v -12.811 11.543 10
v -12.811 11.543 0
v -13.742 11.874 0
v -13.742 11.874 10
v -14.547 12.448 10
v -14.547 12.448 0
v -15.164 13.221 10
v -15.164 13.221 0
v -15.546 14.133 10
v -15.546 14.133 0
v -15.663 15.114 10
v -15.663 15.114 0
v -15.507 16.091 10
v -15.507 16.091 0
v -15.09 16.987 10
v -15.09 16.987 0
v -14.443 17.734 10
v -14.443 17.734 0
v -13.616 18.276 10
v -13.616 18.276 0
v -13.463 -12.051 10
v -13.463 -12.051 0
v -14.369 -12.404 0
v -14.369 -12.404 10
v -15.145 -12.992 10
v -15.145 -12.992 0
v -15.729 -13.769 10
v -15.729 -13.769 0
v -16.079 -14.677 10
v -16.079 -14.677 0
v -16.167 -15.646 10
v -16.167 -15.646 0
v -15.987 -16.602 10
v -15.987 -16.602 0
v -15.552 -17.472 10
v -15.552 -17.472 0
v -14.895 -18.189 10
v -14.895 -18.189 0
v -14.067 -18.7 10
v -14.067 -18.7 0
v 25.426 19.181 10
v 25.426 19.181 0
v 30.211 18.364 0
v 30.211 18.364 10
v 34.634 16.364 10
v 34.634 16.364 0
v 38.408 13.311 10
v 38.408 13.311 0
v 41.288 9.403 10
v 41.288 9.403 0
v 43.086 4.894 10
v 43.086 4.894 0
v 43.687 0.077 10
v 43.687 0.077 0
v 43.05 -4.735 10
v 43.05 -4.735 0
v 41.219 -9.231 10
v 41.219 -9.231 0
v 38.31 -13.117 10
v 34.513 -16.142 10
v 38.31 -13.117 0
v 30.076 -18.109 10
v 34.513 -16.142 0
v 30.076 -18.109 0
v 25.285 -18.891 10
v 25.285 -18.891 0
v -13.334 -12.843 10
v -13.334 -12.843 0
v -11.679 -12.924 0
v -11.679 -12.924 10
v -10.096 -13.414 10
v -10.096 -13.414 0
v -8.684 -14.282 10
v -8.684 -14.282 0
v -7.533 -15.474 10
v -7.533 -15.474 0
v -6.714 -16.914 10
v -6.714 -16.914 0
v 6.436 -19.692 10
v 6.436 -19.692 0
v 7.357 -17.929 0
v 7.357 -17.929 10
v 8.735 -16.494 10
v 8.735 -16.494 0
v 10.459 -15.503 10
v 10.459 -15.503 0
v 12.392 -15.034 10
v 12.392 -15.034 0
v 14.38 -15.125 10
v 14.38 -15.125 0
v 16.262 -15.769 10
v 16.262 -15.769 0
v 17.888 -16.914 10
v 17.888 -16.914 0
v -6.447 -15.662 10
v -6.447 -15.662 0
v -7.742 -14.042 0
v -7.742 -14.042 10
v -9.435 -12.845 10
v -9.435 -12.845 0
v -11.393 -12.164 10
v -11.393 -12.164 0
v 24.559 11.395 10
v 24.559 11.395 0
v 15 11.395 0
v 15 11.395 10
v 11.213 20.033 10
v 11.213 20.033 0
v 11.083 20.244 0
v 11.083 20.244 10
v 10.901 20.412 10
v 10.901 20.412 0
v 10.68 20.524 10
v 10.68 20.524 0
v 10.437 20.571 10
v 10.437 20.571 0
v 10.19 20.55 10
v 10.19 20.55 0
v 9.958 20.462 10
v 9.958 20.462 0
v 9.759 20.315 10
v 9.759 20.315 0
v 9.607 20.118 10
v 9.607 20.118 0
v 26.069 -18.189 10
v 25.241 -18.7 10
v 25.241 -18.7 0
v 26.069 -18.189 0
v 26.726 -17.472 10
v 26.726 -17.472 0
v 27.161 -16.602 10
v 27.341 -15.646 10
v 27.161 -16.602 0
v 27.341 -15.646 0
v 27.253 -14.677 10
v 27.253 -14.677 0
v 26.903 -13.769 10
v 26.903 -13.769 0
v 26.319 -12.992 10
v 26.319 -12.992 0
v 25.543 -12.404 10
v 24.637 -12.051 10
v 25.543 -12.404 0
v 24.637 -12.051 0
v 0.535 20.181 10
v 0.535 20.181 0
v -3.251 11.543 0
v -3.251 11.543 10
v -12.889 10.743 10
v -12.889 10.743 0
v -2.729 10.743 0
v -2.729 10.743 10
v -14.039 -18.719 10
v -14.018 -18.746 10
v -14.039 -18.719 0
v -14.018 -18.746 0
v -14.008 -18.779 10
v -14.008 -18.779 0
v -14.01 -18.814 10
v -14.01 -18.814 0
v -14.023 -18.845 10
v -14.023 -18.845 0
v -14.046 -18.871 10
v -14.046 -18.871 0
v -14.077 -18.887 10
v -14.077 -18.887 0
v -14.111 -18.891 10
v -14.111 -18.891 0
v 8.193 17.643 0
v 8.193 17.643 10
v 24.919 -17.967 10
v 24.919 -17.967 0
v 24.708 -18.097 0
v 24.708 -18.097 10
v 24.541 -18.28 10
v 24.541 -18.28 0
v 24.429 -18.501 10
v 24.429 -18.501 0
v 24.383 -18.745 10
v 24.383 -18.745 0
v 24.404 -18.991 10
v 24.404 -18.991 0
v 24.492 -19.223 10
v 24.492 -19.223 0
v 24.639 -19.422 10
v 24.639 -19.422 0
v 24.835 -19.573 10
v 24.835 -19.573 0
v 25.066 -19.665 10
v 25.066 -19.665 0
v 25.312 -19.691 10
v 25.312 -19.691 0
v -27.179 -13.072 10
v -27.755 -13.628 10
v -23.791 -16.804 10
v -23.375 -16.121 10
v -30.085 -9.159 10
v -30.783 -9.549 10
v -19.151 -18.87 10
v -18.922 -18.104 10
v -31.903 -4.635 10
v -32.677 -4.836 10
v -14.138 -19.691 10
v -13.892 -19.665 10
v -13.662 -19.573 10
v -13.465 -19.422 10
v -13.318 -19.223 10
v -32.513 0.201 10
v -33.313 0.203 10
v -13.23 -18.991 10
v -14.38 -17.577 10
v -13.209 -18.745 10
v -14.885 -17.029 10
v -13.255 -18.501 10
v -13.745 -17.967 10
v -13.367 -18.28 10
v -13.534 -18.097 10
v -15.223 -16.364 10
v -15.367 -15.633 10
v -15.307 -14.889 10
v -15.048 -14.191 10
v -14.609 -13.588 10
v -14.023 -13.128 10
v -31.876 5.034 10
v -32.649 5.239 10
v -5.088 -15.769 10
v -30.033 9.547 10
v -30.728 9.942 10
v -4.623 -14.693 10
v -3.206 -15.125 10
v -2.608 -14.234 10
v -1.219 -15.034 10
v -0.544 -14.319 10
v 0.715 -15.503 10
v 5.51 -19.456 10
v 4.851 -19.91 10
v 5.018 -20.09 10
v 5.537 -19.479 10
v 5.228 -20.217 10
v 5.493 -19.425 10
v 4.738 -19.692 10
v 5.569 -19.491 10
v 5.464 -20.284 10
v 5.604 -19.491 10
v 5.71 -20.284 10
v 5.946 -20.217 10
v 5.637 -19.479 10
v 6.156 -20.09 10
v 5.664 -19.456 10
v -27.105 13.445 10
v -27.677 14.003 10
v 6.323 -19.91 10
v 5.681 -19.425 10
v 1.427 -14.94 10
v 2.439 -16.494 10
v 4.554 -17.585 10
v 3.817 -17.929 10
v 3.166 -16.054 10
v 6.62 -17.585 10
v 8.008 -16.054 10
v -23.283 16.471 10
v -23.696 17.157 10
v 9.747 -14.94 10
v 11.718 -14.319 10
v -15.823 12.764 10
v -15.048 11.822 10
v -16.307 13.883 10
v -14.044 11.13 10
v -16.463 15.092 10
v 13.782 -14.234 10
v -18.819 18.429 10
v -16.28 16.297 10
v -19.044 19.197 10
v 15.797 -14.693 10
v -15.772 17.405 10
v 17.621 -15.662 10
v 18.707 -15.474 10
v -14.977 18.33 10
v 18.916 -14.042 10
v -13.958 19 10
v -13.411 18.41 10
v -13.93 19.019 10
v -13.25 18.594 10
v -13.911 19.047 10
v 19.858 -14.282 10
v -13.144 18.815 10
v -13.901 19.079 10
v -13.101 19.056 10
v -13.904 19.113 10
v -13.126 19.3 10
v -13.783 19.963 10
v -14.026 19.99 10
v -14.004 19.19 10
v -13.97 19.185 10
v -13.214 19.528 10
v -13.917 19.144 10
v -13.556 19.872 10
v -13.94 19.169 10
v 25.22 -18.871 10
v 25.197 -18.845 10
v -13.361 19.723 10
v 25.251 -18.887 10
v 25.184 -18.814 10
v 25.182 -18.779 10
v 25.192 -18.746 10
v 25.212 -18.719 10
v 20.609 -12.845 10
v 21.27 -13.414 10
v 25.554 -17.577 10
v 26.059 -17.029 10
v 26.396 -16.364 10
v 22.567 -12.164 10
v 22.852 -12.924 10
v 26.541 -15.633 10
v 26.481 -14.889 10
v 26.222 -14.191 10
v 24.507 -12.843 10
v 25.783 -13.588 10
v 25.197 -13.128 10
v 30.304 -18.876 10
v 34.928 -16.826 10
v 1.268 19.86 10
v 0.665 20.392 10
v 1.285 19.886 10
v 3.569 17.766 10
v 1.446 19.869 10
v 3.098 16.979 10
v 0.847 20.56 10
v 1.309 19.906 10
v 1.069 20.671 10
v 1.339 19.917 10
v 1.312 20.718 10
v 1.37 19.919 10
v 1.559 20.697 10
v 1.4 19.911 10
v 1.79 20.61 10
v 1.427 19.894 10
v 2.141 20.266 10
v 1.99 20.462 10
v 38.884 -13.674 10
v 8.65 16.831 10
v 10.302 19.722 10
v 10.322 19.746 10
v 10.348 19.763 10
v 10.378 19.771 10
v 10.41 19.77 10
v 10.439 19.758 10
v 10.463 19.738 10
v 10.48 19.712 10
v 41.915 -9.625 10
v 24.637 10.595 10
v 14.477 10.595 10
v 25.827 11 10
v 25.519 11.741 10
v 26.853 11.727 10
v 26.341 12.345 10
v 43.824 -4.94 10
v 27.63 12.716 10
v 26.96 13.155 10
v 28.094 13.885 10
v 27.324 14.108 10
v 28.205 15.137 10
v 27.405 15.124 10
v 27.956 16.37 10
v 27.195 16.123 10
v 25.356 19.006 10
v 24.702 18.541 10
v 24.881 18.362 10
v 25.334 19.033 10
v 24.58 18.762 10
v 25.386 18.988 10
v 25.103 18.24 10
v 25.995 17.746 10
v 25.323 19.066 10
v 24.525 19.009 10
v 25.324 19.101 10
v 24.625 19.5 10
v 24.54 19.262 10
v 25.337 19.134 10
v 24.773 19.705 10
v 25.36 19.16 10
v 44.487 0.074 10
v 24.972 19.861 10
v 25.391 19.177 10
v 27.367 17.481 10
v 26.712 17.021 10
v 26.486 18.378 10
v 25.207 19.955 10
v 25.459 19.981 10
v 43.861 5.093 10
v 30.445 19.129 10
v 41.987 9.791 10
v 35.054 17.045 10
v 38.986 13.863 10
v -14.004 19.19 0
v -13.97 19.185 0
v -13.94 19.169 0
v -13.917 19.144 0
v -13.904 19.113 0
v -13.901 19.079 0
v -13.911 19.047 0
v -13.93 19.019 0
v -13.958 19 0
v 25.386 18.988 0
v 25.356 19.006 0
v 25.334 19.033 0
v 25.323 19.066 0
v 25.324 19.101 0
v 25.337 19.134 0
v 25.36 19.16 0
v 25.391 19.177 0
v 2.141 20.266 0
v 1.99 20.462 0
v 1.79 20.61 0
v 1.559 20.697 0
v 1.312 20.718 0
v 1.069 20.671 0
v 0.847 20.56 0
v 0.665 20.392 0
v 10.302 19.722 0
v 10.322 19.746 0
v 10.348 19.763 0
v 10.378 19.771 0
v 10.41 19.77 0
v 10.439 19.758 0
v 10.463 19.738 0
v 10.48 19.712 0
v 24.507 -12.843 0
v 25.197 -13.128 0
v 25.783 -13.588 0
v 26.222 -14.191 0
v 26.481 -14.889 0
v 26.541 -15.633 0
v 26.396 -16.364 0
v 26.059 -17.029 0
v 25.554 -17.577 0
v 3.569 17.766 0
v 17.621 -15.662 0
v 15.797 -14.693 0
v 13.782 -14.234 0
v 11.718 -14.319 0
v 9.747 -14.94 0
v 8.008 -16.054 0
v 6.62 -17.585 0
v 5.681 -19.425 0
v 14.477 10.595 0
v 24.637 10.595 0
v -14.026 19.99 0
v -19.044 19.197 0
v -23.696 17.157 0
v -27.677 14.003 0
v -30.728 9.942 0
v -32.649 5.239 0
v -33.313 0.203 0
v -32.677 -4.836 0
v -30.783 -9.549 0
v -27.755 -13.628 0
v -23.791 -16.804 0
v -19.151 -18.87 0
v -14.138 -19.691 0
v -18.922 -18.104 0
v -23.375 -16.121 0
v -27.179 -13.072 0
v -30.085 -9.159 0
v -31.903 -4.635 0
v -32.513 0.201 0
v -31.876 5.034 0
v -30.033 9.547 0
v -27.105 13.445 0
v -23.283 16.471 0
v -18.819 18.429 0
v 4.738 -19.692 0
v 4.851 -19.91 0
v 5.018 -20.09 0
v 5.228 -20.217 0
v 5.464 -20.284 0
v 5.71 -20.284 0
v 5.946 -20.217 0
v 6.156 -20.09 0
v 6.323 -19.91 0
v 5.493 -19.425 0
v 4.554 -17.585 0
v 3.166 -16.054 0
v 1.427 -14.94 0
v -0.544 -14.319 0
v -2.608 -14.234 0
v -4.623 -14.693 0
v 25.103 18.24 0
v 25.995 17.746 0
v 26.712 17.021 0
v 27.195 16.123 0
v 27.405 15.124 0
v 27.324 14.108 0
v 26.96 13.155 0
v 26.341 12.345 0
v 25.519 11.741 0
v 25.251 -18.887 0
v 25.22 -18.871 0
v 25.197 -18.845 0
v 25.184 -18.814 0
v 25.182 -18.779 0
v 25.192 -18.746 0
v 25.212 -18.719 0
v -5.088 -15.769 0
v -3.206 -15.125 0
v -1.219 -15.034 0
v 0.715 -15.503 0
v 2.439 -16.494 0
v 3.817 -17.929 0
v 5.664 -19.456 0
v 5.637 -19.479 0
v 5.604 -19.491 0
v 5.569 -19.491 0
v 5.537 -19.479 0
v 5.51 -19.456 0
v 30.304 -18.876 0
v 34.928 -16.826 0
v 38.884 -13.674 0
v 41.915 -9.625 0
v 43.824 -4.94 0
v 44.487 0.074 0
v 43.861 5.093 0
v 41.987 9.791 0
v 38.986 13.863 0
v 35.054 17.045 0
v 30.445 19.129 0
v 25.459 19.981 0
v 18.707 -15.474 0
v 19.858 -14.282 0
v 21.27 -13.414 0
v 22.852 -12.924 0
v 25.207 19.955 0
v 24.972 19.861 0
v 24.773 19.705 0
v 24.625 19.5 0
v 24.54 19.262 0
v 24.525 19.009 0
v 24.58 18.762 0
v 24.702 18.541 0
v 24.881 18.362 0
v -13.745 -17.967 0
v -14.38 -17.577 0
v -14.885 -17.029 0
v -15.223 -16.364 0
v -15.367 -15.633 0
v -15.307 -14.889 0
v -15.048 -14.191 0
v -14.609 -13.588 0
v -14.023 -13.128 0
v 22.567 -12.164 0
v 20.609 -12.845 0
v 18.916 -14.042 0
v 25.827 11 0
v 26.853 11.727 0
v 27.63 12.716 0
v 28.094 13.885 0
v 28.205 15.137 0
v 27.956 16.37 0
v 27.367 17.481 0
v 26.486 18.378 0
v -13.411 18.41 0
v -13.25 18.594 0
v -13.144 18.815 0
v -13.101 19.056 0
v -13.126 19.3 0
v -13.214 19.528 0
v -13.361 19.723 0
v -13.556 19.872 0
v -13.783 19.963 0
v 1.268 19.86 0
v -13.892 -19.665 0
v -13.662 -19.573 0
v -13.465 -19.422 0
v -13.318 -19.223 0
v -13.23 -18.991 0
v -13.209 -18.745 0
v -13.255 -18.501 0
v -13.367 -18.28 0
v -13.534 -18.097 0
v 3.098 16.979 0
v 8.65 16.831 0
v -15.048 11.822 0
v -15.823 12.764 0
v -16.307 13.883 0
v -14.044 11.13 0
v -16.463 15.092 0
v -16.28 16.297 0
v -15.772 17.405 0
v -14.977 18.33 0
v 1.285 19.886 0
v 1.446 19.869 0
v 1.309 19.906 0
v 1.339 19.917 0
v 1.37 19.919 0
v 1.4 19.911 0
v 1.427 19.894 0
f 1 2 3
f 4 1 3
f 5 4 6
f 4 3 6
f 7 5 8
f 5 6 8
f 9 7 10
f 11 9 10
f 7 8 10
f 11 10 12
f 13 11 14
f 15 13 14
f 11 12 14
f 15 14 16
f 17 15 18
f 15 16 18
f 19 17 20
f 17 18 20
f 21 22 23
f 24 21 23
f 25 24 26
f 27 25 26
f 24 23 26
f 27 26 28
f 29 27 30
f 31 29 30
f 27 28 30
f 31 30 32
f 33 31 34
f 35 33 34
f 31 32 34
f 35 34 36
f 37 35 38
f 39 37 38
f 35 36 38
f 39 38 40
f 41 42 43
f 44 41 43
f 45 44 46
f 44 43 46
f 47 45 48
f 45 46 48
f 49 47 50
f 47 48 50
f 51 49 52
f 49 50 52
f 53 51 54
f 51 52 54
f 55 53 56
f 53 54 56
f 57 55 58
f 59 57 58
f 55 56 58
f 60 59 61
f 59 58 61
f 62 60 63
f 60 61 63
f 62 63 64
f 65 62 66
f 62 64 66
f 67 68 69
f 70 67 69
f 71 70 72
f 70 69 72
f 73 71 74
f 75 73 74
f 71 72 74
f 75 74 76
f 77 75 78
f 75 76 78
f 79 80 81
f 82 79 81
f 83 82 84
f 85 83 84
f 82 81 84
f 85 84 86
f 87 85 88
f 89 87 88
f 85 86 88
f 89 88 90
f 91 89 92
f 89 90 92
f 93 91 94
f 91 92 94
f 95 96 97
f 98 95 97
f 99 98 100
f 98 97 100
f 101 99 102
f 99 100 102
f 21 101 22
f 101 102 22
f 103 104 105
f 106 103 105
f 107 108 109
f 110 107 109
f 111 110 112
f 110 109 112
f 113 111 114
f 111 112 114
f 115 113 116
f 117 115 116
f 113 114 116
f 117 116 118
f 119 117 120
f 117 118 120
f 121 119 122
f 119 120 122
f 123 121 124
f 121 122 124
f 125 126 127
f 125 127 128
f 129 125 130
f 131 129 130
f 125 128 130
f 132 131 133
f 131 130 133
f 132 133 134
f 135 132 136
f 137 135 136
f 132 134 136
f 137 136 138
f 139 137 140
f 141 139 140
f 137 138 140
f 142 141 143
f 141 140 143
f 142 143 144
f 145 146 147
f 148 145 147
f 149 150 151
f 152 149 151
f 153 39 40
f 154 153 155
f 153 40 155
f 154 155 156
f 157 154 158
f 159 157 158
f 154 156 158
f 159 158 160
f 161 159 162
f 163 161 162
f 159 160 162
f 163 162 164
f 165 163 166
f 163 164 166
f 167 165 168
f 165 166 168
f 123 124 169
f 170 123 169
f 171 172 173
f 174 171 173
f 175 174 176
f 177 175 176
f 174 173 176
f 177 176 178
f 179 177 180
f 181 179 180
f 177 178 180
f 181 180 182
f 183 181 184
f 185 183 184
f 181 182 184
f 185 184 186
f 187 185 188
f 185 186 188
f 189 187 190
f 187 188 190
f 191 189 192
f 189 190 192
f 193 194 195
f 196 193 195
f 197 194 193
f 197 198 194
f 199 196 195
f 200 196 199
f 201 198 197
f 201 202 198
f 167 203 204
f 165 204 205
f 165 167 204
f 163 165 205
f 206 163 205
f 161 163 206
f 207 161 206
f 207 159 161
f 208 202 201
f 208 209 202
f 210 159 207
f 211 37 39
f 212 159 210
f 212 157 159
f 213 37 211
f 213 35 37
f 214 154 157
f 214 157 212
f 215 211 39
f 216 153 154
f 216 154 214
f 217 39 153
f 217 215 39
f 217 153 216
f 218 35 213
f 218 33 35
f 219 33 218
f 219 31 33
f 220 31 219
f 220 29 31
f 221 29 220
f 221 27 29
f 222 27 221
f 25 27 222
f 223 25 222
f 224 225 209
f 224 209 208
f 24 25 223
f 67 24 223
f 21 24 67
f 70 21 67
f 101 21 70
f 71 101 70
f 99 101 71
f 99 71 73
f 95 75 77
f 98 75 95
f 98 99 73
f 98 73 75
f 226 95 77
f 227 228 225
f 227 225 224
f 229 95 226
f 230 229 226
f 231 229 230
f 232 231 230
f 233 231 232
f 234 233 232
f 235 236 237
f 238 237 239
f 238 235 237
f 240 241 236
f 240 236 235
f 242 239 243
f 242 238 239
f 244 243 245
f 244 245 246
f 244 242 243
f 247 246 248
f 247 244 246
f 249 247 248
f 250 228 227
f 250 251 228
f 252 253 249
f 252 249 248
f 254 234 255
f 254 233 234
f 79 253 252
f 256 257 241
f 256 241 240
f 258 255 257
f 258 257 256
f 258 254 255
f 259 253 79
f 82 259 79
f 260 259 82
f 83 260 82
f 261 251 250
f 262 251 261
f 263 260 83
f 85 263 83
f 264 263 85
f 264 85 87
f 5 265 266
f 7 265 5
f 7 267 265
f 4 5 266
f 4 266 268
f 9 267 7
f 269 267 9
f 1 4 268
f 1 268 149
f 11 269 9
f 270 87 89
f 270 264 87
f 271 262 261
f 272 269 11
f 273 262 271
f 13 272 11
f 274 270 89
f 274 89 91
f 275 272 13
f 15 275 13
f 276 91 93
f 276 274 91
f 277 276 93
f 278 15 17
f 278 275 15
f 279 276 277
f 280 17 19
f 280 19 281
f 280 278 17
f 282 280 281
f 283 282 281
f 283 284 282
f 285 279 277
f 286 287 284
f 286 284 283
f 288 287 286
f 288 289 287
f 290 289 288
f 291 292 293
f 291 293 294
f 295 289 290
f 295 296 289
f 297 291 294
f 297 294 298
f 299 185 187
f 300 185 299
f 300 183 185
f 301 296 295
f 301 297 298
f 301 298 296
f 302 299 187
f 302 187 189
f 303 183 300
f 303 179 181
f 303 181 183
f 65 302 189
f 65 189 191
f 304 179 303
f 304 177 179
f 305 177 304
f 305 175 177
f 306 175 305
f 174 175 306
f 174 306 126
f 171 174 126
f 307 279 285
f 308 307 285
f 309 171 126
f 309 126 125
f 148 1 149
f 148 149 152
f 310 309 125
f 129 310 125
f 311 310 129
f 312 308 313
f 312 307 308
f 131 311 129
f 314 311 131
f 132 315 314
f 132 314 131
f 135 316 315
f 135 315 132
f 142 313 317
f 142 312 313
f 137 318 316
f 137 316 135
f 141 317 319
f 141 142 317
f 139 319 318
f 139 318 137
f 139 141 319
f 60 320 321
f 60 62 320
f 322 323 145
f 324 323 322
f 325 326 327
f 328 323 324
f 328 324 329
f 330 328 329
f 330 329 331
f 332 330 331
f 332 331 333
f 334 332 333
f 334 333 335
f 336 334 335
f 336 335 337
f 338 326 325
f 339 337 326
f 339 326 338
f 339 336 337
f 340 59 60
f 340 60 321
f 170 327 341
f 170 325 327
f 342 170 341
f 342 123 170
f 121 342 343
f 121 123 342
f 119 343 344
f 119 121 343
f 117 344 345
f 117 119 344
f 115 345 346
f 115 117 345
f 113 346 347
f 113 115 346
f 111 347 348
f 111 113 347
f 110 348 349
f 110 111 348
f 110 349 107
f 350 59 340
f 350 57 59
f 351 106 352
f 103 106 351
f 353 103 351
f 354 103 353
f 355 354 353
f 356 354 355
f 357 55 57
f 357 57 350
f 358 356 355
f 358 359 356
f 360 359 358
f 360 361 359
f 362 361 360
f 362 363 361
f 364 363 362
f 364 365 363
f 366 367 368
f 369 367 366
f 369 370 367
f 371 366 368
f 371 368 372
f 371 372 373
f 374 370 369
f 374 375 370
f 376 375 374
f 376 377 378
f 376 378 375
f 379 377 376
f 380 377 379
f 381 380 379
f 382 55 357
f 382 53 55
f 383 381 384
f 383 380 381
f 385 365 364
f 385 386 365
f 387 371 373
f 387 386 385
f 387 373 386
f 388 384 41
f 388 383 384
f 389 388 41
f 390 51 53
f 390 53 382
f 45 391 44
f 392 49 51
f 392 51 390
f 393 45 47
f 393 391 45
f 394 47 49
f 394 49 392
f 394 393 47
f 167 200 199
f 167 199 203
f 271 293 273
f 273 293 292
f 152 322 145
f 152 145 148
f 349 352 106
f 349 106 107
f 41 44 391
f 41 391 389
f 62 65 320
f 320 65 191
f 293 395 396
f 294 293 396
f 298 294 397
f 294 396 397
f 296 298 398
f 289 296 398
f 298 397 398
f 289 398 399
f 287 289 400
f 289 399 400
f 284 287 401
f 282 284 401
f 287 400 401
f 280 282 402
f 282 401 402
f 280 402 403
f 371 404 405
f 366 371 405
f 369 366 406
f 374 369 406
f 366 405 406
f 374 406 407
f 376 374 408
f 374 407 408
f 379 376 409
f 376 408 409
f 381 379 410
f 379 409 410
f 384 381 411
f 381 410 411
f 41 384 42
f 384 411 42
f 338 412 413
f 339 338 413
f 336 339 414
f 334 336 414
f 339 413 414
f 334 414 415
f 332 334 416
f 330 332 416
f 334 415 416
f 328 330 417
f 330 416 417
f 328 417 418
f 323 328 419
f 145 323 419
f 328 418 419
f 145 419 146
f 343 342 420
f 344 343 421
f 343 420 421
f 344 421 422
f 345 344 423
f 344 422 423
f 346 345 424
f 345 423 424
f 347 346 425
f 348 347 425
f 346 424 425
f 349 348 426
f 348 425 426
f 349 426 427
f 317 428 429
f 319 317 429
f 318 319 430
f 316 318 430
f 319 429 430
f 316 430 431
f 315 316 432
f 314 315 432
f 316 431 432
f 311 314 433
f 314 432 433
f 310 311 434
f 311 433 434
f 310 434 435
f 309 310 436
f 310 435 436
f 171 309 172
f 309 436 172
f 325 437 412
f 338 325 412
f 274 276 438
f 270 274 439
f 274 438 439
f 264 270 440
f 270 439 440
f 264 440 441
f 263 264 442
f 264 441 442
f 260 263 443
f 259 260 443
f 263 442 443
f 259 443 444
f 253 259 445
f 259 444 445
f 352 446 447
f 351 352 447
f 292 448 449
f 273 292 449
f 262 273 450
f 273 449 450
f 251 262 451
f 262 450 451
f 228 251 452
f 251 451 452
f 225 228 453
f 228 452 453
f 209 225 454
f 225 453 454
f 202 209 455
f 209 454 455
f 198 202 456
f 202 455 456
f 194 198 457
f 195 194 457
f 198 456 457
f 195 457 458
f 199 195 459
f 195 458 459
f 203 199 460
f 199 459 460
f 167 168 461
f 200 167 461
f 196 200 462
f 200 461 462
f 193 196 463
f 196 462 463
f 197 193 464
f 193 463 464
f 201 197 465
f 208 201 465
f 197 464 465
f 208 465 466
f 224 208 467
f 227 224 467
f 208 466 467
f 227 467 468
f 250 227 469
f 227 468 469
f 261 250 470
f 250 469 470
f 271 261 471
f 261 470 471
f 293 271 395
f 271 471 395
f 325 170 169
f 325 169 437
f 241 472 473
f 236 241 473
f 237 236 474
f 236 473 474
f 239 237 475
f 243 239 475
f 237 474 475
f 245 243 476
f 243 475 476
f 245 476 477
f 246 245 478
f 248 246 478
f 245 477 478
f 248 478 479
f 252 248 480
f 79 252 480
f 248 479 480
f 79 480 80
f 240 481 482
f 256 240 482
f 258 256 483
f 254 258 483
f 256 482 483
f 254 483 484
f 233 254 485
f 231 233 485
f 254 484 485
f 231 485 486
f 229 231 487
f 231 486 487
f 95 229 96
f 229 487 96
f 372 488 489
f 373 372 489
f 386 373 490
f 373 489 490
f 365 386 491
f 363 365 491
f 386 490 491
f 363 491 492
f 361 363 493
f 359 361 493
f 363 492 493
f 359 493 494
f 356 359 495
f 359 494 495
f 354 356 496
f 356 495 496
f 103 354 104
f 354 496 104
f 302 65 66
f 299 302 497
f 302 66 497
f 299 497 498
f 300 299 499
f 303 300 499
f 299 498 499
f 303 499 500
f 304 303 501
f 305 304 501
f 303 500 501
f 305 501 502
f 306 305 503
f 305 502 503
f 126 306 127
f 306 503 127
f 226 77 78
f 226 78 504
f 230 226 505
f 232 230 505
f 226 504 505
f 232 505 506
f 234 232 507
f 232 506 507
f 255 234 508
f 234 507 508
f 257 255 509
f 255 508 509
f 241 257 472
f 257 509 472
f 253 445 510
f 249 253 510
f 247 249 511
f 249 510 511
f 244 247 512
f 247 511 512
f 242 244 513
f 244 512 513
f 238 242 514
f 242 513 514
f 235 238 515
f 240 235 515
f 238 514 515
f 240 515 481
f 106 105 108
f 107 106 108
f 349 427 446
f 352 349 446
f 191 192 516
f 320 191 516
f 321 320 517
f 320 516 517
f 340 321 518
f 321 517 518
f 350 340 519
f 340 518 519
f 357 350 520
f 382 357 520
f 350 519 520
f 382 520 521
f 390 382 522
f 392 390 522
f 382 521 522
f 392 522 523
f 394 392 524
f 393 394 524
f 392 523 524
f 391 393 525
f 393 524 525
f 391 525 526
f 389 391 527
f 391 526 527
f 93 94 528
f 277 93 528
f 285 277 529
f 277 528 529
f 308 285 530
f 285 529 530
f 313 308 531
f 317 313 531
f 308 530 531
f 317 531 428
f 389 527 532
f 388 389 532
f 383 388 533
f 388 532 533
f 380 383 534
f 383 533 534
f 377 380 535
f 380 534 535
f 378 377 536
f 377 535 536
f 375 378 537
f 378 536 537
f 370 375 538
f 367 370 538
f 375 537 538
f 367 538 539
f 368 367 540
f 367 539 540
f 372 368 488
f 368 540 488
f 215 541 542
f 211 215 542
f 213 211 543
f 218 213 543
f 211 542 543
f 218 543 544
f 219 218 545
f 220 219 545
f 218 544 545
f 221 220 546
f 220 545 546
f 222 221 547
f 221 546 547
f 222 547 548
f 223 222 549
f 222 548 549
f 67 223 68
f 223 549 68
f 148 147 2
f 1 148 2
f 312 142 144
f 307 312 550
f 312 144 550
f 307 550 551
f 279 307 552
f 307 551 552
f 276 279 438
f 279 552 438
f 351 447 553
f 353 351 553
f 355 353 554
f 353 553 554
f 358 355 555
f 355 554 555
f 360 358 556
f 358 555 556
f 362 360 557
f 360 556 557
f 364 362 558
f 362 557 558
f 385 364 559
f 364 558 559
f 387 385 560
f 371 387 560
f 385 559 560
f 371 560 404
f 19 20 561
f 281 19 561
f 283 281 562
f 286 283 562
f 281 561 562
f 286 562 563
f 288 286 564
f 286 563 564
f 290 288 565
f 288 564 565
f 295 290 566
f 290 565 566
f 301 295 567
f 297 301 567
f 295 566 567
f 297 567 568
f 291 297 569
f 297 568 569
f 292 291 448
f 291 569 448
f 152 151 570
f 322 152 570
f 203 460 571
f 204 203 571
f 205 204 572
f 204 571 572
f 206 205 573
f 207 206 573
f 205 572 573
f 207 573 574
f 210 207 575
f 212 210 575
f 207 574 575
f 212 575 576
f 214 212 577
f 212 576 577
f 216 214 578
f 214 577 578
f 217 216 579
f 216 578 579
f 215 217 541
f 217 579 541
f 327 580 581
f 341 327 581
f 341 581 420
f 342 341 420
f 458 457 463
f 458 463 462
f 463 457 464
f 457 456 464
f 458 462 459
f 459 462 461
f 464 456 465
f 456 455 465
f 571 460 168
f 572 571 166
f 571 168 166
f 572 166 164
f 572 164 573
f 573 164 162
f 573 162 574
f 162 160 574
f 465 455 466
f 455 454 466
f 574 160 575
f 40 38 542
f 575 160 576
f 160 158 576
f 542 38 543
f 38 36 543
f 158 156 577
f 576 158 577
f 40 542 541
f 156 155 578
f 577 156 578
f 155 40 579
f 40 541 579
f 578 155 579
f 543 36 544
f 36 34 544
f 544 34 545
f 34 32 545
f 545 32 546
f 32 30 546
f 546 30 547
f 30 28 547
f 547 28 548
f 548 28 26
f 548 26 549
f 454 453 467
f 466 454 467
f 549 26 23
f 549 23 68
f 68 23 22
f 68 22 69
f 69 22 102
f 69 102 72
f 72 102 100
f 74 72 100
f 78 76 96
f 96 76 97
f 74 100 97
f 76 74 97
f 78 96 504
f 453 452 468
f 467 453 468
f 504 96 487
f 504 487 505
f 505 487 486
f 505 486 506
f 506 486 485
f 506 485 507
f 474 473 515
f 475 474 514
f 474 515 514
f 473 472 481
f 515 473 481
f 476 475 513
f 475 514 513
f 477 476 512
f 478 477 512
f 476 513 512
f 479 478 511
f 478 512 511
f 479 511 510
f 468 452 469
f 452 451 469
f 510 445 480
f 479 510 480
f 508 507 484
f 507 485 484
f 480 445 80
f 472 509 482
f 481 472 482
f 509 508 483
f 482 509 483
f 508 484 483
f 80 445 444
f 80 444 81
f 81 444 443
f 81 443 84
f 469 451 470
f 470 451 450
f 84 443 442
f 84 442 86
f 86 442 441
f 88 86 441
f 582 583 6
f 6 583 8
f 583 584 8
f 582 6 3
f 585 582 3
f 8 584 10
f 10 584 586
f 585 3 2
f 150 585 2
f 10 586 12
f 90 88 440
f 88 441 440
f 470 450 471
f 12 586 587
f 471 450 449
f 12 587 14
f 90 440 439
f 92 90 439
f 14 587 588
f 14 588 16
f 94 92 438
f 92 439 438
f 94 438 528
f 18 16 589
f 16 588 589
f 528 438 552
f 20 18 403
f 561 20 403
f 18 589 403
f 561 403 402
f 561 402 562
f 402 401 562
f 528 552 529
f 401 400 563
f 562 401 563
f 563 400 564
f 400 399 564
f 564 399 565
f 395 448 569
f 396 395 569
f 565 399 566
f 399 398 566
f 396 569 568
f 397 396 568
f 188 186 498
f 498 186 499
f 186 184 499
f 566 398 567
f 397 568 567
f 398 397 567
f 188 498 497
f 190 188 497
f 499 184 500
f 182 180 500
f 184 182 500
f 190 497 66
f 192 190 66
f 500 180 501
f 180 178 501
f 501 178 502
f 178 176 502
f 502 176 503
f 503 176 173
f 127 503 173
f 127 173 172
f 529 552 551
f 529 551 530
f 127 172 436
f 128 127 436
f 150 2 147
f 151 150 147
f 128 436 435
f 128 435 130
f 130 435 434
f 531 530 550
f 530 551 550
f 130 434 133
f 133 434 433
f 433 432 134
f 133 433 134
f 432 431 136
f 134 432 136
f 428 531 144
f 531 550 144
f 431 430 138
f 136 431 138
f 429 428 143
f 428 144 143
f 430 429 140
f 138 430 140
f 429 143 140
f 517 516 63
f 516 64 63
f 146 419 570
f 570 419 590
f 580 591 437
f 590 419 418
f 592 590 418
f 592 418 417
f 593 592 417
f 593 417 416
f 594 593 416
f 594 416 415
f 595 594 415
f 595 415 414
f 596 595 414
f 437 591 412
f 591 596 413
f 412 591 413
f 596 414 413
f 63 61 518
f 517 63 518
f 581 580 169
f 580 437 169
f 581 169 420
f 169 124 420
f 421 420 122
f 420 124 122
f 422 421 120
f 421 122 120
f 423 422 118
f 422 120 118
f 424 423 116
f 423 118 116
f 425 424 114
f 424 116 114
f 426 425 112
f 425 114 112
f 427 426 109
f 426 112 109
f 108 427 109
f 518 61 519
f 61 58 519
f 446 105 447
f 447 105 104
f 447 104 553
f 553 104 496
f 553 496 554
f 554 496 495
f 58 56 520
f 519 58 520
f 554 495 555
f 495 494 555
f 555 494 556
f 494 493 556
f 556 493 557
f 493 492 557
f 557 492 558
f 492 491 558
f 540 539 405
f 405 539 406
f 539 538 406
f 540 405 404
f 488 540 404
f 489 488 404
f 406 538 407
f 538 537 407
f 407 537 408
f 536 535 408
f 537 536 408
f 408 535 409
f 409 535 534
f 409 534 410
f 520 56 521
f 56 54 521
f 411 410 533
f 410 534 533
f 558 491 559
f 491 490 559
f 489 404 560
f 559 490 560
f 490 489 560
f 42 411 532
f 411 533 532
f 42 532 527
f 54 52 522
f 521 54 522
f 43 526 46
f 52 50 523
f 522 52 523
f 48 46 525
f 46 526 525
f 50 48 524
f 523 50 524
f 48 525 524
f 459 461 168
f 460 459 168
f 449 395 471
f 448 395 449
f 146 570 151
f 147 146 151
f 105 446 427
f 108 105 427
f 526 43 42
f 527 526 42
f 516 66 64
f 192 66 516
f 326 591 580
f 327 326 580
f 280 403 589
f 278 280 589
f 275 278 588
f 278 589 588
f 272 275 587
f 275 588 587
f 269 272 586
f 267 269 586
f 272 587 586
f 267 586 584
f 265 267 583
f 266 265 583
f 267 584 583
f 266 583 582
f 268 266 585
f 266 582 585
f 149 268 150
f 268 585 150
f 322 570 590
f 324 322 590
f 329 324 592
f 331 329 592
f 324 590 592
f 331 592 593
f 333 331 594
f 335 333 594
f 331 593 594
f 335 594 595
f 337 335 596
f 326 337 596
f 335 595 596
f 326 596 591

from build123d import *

# Parameters (mm, degrees)
F1_DEPTH = 10


with BuildPart() as f1:
    # F0 (on Top) → F1 (new body)
    with BuildSketch(Plane.XY):
        with BuildLine():
            ThreePointArc((-6.714271, -16.914273), (-0.235273, -15.199649), (4.738337, -19.691927))
            ThreePointArc((4.738337, -19.691927), (5.586952, -20.29217), (6.435566, -19.691927))
            ThreePointArc((6.435566, -19.691927), (11.409176, -15.199649), (17.888174, -16.914273))
            ThreePointArc((17.888174, -16.914273), (20.536513, -13.803613), (24.507416, -12.843491))
            ThreePointArc((24.507416, -12.843491), (26.536414, -15.25895), (24.919216, -17.967445))
            ThreePointArc((24.919216, -17.967445), (24.4038, -18.991339), (25.311912, -19.690872))
            ThreePointArc((25.311912, -19.690872), (44.486815, 0.074047), (25.459012, 19.98062))
            ThreePointArc((25.459012, 19.98062), (24.539987, 19.261705), (25.10301, 18.23972))
            ThreePointArc((25.10301, 18.23972), (27.400825, 14.613237), (24.559428, 11.394885))
            Line((24.559428, 11.394885), (14.999758, 11.394885))
            Line((14.999758, 11.394885), (11.213153, 20.033227))
            ThreePointArc((11.213153, 20.033227), (10.436556, 20.570639), (9.607449, 20.118428))
            Line((9.607449, 20.118428), (8.193074, 17.643271))
            Line((8.193074, 17.643271), (3.569399, 17.76631))
            Line((3.569399, 17.76631), (2.140906, 20.266173))
            ThreePointArc((2.140906, 20.266173), (1.311799, 20.718384), (0.535203, 20.180972))
            Line((0.535203, 20.180972), (-3.251402, 11.54263))
            Line((-3.251402, 11.54263), (-12.811073, 11.54263))
            ThreePointArc((-12.811073, 11.54263), (-15.638403, 14.619541), (-13.616246, 18.276324))
            ThreePointArc((-13.616246, 18.276324), (-13.125555, 19.299533), (-14.026369, 19.989655))
            ThreePointArc((-14.026369, 19.989655), (-33.31297, 0.203497), (-14.138009, -19.690872))
            ThreePointArc((-14.138009, -19.690872), (-13.229897, -18.991339), (-13.745313, -17.967445))
            ThreePointArc((-13.745313, -17.967445), (-15.362511, -15.25895), (-13.333513, -12.843491))
            ThreePointArc((-13.333513, -12.843491), (-9.36261, -13.803613), (-6.714271, -16.914273))
        make_face()
        with BuildLine():
            ThreePointArc((-14.110806, -18.891334), (-32.512973, 0.201246), (-14.003666, 19.189977))
            ThreePointArc((-14.003666, 19.189977), (-13.903576, 19.113297), (-13.958097, 18.999607))
            ThreePointArc((-13.958097, 18.999607), (-16.427445, 14.482007), (-12.888596, 10.74263))
            Line((-12.888596, 10.74263), (-2.728596, 10.74263))
            Line((-2.728596, 10.74263), (1.2679, 19.859795))
            ThreePointArc((1.2679, 19.859795), (1.354189, 19.919508), (1.446312, 19.869262))
            Line((1.446312, 19.869262), (3.098136, 16.978568))
            Line((3.098136, 16.978568), (8.650219, 16.830822))
            Line((8.650219, 16.830822), (10.302044, 19.721517))
            ThreePointArc((10.302044, 19.721517), (10.394167, 19.771763), (10.480455, 19.71205))
            Line((10.480455, 19.71205), (14.476952, 10.594885))
            Line((14.476952, 10.594885), (24.636952, 10.594885))
            ThreePointArc((24.636952, 10.594885), (28.19471, 14.507176), (25.386326, 18.987873))
            ThreePointArc((25.386326, 18.987873), (25.323767, 19.101427), (25.425881, 19.181307))
            ThreePointArc((25.425881, 19.181307), (43.686821, 0.077013), (25.284709, -18.891334))
            ThreePointArc((25.284709, -18.891334), (25.183808, -18.813608), (25.241076, -18.699842))
            ThreePointArc((25.241076, -18.699842), (27.330713, -15.158302), (24.636952, -12.051417))
            ThreePointArc((24.636952, -12.051417), (20.608667, -12.845247), (17.621218, -15.661696))
            ThreePointArc((17.621218, -15.661696), (10.711949, -14.563871), (5.681242, -19.425476))
            ThreePointArc((5.681242, -19.425476), (5.586952, -19.49217), (5.492661, -19.425476))
            ThreePointArc((5.492661, -19.425476), (0.461954, -14.563871), (-6.447315, -15.661696))
            ThreePointArc((-6.447315, -15.661696), (-9.434764, -12.845247), (-13.463048, -12.051417))
            ThreePointArc((-13.463048, -12.051417), (-16.15681, -15.158302), (-14.067173, -18.699842))
            ThreePointArc((-14.067173, -18.699842), (-14.009905, -18.813608), (-14.110806, -18.891334))
        make_face(mode=Mode.SUBTRACT)
    extrude(amount=F1_DEPTH)


solid = f1.part
